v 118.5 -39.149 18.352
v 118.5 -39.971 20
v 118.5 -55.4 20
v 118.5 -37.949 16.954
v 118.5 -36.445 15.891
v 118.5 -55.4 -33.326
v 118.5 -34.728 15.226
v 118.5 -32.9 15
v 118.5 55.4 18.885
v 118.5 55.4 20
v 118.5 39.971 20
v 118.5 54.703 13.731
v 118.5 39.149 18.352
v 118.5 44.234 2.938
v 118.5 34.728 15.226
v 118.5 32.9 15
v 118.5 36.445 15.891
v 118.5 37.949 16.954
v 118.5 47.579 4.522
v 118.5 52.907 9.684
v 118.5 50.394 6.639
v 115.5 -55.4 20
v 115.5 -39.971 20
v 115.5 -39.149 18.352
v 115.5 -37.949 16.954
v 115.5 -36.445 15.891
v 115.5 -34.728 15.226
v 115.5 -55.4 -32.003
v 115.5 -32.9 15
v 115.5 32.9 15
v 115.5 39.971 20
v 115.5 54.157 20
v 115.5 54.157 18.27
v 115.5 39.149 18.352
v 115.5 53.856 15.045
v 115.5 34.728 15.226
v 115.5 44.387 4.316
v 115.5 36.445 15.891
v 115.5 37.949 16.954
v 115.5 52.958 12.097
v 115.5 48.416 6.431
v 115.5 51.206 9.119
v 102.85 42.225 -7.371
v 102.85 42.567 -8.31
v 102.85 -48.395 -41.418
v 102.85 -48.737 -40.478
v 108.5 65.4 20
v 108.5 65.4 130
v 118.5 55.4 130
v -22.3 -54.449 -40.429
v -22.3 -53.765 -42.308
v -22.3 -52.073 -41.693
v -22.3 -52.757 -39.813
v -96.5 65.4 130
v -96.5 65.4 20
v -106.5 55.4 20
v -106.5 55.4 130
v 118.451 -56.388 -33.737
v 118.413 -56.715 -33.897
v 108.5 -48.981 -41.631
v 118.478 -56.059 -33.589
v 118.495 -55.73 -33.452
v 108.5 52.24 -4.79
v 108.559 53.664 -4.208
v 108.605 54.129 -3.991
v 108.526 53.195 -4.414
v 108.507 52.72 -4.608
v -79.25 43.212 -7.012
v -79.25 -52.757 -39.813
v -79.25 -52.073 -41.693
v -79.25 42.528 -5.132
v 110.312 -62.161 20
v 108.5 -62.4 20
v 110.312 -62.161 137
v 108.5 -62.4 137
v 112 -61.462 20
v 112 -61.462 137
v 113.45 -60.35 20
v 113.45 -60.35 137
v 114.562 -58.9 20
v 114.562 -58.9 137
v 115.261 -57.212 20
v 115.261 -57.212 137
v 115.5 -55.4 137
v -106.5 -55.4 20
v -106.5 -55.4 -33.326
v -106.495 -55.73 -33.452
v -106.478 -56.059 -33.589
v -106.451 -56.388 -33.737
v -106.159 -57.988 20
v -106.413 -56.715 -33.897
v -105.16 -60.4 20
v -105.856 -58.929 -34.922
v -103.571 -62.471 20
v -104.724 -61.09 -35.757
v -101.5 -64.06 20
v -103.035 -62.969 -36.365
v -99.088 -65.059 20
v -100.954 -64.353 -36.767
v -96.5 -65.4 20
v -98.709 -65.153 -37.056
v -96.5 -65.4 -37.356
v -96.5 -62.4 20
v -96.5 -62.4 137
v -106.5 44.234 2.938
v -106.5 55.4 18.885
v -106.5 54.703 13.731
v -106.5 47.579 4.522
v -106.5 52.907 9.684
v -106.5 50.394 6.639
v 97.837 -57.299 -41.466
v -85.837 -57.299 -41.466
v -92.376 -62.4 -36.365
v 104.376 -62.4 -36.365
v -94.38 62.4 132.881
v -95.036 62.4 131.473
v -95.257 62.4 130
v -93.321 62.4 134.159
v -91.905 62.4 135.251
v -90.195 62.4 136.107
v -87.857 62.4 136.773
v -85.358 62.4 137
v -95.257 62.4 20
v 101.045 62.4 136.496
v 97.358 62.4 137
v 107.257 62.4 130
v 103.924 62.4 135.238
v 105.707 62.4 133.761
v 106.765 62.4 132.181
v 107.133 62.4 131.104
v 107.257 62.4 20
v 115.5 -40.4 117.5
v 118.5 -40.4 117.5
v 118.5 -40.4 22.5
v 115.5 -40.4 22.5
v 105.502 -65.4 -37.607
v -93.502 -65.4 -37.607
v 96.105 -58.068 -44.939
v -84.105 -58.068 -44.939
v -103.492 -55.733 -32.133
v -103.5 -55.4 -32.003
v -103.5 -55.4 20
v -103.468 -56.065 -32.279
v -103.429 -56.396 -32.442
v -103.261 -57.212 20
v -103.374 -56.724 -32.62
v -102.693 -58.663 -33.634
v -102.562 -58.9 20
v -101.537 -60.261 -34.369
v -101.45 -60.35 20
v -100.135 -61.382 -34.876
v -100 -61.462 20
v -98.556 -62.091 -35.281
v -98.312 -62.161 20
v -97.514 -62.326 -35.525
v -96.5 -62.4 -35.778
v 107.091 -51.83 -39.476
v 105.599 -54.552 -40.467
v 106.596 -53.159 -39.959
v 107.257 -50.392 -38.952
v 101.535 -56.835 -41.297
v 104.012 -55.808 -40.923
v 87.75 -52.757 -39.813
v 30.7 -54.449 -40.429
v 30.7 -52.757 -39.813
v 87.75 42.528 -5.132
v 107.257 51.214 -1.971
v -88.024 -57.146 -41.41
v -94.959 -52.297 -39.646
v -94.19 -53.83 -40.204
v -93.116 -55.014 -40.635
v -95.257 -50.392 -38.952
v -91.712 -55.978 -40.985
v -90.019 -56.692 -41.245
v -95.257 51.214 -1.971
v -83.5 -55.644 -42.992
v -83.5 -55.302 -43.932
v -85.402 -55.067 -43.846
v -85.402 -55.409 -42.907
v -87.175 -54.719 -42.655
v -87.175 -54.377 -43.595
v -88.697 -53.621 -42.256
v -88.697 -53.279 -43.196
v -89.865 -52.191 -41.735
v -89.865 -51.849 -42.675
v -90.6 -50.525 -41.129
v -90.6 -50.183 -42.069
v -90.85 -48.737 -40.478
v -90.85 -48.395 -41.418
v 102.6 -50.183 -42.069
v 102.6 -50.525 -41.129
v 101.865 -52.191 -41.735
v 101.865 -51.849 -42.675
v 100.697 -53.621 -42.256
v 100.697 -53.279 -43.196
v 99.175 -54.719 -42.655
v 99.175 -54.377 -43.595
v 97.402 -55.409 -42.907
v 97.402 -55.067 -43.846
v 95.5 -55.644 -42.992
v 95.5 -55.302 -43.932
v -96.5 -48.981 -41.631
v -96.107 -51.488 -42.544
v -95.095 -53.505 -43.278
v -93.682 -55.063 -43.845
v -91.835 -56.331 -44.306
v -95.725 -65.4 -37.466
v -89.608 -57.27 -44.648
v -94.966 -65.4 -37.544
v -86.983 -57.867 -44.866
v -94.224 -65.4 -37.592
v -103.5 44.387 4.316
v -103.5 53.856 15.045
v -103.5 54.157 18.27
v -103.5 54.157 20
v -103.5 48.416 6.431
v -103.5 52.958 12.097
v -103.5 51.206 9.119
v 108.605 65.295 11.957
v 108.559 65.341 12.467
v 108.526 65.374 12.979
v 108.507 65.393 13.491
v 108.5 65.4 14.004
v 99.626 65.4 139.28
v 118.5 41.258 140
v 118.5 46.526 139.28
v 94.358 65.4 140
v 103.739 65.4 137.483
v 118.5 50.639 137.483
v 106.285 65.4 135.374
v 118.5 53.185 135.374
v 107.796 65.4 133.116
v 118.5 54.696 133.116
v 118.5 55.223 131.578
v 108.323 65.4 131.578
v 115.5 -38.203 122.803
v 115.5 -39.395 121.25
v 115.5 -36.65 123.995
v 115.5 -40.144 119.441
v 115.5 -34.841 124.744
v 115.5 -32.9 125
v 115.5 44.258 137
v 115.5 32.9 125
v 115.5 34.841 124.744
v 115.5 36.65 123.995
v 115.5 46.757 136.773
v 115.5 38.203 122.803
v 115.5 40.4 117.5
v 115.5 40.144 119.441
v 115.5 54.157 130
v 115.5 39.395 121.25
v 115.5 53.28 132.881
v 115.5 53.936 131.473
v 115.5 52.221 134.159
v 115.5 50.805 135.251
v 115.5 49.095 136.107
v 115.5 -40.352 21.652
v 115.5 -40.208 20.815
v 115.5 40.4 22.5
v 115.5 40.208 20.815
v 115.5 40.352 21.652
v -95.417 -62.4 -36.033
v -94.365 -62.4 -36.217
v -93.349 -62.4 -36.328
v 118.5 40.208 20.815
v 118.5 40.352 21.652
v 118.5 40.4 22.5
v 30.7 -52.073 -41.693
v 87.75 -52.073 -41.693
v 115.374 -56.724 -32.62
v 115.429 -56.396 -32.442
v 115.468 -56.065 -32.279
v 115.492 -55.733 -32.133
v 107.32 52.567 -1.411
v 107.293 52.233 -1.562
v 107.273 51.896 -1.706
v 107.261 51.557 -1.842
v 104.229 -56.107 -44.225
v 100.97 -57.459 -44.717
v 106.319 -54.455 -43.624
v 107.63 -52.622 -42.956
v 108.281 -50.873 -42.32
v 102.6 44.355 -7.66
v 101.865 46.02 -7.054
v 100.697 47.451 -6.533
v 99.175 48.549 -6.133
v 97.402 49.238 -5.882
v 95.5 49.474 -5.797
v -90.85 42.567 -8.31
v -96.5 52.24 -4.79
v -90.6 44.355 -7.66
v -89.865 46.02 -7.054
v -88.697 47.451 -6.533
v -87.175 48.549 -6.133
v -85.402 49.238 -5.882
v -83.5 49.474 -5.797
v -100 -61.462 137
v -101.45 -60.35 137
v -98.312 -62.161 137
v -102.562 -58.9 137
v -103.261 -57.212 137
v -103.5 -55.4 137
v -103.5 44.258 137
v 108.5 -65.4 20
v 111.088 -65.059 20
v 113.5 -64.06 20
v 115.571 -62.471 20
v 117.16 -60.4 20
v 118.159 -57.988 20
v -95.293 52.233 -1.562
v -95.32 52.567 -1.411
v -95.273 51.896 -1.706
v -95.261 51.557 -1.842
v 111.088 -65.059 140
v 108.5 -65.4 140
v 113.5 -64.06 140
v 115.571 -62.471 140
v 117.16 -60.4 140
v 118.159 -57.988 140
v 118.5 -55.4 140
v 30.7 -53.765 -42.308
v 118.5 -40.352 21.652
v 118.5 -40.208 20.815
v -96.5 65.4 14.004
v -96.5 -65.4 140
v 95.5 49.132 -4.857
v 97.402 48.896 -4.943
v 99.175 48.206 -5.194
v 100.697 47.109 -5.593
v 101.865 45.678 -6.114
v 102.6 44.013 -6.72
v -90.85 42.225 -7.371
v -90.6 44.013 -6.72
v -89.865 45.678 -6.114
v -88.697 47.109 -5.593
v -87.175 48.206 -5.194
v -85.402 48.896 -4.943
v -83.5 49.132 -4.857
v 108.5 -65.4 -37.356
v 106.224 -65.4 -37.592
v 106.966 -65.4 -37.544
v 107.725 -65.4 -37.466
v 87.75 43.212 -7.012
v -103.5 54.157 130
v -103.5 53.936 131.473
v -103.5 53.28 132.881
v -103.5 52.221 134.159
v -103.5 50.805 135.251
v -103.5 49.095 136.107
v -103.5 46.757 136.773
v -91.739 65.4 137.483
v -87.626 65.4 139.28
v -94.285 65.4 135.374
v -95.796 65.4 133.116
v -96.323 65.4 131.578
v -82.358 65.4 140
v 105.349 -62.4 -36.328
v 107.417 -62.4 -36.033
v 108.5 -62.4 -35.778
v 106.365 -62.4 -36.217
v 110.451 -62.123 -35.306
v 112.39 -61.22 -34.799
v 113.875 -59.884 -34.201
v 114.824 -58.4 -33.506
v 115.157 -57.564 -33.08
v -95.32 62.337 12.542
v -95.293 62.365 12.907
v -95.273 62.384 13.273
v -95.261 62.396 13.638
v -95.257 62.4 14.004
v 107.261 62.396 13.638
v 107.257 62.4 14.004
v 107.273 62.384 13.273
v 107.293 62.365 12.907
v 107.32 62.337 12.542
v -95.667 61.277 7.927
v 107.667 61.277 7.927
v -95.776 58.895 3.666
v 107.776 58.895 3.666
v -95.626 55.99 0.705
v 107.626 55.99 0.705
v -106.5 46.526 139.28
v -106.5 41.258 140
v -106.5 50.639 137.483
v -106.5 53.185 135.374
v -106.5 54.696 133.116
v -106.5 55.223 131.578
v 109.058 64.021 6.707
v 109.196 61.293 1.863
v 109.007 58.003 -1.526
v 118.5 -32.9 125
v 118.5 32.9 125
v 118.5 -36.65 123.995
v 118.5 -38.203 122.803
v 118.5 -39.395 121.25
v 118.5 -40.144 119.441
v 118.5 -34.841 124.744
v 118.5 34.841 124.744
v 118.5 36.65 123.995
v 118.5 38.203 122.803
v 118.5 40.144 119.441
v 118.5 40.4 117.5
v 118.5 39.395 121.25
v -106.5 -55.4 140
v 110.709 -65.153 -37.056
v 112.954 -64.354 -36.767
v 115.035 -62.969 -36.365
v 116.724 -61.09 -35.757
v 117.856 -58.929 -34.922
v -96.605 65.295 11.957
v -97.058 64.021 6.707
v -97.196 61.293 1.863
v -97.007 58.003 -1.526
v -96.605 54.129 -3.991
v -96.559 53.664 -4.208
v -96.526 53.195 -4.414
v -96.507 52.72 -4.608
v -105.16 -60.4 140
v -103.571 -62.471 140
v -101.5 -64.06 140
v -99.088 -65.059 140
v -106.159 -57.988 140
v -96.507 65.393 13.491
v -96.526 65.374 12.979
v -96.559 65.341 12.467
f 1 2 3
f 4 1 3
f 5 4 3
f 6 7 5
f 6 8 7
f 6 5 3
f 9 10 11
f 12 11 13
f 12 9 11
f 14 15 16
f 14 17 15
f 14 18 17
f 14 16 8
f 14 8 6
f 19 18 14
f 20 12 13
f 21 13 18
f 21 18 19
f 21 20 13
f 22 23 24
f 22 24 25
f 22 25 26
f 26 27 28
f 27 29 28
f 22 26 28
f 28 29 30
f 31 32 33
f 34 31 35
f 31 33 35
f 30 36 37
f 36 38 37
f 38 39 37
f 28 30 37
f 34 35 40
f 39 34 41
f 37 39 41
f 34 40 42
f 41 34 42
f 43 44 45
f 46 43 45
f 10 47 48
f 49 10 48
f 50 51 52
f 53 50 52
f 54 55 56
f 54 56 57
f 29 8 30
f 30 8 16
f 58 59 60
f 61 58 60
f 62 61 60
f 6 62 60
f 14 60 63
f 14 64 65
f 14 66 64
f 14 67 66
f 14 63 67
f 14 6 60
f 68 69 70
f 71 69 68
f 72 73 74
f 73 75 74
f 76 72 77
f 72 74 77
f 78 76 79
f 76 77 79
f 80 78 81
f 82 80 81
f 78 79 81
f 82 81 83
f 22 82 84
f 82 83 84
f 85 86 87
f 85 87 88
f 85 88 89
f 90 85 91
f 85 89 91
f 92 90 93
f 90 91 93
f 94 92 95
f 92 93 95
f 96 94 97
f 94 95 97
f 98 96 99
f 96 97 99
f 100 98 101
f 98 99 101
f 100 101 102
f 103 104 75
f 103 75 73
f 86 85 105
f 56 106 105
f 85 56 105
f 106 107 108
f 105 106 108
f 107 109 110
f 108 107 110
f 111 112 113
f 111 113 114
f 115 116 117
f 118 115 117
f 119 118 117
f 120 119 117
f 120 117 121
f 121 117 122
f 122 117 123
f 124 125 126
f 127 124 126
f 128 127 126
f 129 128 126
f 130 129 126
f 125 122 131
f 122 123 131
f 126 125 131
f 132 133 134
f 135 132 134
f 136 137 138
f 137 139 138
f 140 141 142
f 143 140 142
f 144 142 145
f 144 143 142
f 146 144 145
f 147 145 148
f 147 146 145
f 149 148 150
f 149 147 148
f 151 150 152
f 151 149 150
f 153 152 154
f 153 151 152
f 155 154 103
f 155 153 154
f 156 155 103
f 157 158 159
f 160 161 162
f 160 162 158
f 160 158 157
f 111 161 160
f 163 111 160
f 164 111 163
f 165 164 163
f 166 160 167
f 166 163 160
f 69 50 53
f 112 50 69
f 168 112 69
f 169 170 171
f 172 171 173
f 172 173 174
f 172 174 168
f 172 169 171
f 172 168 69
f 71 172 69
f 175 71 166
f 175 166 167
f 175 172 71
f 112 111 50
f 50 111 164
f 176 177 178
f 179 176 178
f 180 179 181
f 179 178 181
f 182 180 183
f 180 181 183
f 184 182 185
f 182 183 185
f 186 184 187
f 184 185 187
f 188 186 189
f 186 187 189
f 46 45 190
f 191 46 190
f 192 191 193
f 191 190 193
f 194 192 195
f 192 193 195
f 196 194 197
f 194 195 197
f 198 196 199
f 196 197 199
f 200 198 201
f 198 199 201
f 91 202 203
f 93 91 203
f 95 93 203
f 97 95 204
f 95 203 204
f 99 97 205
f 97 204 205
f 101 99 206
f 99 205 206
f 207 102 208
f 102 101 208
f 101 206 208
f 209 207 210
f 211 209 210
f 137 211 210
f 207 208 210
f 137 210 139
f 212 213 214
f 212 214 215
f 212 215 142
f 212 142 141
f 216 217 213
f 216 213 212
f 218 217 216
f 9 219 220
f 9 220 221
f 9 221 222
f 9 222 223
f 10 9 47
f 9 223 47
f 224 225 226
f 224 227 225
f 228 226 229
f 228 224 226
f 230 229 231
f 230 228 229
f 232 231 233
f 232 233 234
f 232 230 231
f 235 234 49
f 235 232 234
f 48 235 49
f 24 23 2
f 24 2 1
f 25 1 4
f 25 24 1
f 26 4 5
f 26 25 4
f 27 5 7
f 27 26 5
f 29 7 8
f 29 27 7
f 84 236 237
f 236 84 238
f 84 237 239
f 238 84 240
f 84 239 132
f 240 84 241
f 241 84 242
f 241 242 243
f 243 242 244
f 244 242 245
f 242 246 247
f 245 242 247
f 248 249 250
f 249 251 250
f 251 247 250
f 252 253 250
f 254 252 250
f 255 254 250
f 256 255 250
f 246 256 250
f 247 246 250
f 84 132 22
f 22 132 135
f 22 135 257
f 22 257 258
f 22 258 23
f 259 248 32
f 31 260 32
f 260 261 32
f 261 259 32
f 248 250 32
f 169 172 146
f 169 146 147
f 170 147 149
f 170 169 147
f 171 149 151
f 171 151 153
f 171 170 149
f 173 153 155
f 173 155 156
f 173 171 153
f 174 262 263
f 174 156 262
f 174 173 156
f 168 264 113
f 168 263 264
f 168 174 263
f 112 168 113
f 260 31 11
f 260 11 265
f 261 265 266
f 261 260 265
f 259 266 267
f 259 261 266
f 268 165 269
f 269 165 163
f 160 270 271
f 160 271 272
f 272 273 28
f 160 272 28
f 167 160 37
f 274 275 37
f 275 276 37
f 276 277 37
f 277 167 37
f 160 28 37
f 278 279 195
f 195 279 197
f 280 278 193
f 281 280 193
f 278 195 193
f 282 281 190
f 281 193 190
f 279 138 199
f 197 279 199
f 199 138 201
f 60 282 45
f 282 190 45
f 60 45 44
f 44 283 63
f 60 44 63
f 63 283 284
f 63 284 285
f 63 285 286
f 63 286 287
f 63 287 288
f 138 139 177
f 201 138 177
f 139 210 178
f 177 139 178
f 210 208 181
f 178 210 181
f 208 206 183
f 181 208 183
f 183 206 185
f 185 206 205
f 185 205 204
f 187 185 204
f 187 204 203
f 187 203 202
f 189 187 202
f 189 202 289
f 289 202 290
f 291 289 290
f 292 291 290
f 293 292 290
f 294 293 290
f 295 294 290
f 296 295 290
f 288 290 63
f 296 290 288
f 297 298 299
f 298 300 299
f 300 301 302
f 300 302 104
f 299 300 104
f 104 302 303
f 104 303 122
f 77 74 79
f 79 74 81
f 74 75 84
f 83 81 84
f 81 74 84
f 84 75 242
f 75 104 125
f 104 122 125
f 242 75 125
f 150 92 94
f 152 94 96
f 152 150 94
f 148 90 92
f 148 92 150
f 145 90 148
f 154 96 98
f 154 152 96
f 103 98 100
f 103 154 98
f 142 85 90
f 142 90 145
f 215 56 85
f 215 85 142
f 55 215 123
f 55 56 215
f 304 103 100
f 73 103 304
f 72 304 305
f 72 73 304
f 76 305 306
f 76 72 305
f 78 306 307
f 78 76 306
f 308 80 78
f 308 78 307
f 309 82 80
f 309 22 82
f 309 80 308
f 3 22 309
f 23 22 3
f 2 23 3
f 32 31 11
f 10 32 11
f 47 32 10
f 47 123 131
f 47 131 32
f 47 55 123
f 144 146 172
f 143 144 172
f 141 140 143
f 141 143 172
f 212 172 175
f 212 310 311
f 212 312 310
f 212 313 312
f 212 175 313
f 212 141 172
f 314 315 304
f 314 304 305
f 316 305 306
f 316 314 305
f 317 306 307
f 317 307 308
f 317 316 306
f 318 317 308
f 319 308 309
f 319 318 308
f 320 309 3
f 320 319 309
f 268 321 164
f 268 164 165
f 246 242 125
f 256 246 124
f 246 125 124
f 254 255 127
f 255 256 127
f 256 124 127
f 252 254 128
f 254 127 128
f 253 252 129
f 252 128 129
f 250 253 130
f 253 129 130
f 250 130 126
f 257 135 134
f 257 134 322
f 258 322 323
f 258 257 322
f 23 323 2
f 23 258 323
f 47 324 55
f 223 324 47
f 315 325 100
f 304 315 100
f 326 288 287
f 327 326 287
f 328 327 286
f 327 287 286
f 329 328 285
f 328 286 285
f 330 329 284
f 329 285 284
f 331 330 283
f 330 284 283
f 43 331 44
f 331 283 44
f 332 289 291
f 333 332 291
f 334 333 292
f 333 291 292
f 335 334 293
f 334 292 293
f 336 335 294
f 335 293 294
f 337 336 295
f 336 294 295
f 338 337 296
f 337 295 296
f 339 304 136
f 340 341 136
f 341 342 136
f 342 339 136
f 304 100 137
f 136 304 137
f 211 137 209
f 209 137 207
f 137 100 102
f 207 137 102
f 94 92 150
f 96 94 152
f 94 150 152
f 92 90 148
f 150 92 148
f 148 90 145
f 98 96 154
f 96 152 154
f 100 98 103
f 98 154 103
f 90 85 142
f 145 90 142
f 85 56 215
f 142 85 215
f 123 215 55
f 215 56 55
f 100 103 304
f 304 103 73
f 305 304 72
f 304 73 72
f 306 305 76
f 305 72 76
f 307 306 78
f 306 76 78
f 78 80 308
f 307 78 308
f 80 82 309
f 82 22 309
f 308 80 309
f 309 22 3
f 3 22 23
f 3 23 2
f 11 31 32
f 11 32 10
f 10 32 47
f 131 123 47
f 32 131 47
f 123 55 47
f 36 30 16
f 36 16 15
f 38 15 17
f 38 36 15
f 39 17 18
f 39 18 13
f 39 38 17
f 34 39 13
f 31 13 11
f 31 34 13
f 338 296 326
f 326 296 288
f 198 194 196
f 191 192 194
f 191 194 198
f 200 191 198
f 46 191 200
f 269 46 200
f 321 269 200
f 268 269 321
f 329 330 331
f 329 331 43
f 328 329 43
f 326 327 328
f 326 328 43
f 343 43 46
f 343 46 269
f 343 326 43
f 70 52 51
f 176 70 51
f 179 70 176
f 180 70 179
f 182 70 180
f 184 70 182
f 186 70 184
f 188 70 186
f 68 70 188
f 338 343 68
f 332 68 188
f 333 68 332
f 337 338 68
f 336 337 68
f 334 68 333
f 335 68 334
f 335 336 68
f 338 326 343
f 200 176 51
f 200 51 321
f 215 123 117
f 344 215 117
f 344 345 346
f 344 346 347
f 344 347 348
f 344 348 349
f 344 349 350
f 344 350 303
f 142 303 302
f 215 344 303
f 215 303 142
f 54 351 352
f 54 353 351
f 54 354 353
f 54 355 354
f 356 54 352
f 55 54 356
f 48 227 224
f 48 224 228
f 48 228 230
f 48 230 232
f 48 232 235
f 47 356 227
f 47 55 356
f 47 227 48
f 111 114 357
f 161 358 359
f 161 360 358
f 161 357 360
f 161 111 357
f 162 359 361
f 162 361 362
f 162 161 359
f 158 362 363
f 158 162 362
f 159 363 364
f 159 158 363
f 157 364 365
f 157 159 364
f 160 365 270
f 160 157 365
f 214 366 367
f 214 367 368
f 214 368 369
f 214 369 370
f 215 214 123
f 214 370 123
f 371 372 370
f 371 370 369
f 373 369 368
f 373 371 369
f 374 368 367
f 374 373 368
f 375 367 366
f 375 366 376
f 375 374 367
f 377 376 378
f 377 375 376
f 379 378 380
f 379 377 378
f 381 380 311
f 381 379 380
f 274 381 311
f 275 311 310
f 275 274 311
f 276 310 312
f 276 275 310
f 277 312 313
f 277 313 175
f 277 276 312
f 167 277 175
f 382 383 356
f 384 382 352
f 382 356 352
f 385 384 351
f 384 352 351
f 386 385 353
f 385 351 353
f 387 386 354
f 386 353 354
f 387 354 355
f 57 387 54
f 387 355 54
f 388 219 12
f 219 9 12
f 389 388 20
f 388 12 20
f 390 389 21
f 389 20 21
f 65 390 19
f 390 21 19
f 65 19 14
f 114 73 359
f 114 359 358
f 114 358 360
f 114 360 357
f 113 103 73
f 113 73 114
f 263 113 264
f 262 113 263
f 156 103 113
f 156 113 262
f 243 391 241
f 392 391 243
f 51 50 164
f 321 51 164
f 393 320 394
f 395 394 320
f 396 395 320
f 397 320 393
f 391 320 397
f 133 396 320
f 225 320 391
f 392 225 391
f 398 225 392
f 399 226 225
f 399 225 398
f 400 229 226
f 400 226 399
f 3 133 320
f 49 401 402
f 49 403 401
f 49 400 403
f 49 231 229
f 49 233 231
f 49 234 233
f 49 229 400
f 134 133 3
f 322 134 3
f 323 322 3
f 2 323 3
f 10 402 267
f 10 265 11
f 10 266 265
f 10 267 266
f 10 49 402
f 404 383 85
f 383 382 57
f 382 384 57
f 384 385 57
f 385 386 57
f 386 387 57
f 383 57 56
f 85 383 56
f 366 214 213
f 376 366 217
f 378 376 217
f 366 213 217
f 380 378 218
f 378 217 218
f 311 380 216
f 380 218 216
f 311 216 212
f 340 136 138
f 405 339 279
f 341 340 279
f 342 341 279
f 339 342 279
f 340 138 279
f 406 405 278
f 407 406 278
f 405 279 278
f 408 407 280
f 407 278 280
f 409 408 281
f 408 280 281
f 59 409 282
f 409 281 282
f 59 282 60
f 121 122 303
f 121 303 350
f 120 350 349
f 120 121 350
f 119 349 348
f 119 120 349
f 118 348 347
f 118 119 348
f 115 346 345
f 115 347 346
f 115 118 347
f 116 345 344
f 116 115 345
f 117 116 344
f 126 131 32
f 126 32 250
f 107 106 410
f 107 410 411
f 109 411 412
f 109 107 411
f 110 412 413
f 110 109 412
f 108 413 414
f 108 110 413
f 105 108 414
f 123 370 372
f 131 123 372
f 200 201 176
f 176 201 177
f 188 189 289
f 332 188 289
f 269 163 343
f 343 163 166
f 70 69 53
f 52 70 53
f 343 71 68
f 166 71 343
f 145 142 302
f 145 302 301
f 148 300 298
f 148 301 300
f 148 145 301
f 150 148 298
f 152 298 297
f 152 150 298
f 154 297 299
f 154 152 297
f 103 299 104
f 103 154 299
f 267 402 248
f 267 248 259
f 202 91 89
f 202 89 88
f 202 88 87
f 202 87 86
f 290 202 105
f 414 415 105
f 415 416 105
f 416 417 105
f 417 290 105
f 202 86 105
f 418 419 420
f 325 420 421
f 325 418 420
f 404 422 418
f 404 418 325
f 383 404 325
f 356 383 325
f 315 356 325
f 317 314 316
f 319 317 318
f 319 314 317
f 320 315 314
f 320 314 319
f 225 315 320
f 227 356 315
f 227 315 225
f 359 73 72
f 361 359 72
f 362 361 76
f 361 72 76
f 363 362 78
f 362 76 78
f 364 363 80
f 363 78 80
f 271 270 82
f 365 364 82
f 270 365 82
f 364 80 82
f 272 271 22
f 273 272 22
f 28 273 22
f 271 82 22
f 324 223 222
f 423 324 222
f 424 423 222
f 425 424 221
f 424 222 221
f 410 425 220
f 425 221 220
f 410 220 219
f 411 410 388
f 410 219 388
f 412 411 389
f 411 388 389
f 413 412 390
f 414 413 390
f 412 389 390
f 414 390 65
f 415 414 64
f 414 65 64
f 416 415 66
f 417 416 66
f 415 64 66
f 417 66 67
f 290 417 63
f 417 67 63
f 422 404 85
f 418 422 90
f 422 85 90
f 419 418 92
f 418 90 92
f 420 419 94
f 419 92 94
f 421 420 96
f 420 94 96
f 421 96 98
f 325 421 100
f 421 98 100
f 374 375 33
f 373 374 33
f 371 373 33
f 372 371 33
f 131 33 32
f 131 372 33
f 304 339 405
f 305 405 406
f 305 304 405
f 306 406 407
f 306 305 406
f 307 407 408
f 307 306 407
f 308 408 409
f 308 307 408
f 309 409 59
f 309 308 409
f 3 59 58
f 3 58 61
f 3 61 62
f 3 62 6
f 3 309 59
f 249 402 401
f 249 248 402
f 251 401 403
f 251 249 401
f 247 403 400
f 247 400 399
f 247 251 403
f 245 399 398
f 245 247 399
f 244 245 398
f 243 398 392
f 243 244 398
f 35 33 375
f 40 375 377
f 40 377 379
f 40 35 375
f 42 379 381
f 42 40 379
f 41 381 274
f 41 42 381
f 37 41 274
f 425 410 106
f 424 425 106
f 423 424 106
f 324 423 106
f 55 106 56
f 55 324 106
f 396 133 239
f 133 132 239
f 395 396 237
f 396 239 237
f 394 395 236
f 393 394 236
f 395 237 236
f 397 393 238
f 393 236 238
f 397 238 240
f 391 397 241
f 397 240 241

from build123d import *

# Parameters (mm, degrees)
SKETCH1_W           = 225
SKETCH1_H           = 130.8
BOSS_EXTRUDE1_DEPTH = 140
BOSS_EXTRUDE2_DEPTH = 225
CHAMFER1_SIZE       = 10
FILLET1_R           = 10
FILLET2_R           = 20
FILLET3_R           = 24
CHAMFER2_SIZE       = 10
CHAMFER2_SIZE2      = 7.802060087
FILLET4_R           = 12.5
FILLET5_R           = 10
SHELL1_T            = 3
SKETCH3_W           = 110
SKETCH3_H           = 80.8
CUT_EXTRUDE1_DEPTH  = 3
FILLET6_R           = 7.5
CUT_EXTRUDE2_DEPTH  = 1
CUT_EXTRUDE3_REACH  = 212.374
SKETCH6_W           = 53
SKETCH6_H           = 3
SKETCH6_W_2         = 167
SKETCH6_H_2         = 101.4


with BuildPart() as part:
    # Sketch1 → Boss-Extrude1 (new body)
    with BuildSketch(Plane.XY):
        with Locations((6, 0)):
            Rectangle(SKETCH1_W, SKETCH1_H)
    extrude(amount=BOSS_EXTRUDE1_DEPTH)

    # Sketch2 → Boss-Extrude2 (add)
    with BuildSketch(Plane.ZY.offset(106.5)):
        Polygon((-47.607306642, -65.4), (0, 65.4), (0, -65.4), align=None)
    extrude(amount=-BOSS_EXTRUDE2_DEPTH)

    # Chamfer1
    chamfer1_edges = [part.edges().sort_by_distance(p)[0] for p in [
        (118.5, 0, -23.803653321),
        (-106.5, 0, -23.803653321),
        (118.5, 65.4, 70),
        (-106.5, 65.4, 70),
    ]]
    chamfer(chamfer1_edges, length=CHAMFER1_SIZE)

    # Fillet1
    fillet1_edges = [part.edges().sort_by_distance(p)[0] for p in [
        (113.5, 60.4, 140),
        (-101.5, 60.4, 140),
    ]]
    fillet(fillet1_edges, radius=FILLET1_R)

    # Fillet2
    fillet2_edges = [part.edges().sort_by_distance(p)[0] for p in [
        (6, 65.4, 0),
    ]]
    fillet(fillet2_edges, radius=FILLET2_R)

    # Fillet3
    fillet3_edges = [part.edges().sort_by_distance(p)[0] for p in [
        (-103.308479557, 58.591520443, 4.76734871),
        (115.308479557, 58.591520443, 4.76734871),
    ]]
    fillet(fillet3_edges, radius=FILLET3_R)

    # Chamfer2
    chamfer2_edges = [part.edges().sort_by_distance(p)[0] for p in [
        (6, -65.4, -47.607306642),
    ]]
    chamfer2_side = [part.faces().sort_by_distance(p)[0] for p in [
        (6, -65.4, 46.424462894),
    ]]
    chamfer(chamfer2_edges, length=CHAMFER2_SIZE, length2=CHAMFER2_SIZE2, reference=chamfer2_side[0])

    # Fillet4
    fillet4_edges = [part.edges().sort_by_distance(p)[0] for p in [
        (113.198463104, -61.734230855, -41.273075787),
        (-101.198463104, -61.734230855, -41.273075787),
    ]]
    fillet(fillet4_edges, radius=FILLET4_R)

    # Fillet5
    fillet5_edges = [part.edges().sort_by_distance(p)[0] for p in [
        (-106.5, -65.4, 53.126939576),
        (118.5, -65.4, 53.126939576),
    ]]
    fillet(fillet5_edges, radius=FILLET5_R)

    # Shell1 (no face opened: a closed hollow body)
    add(offset(amount=-SHELL1_T, mode=Mode.PRIVATE), mode=Mode.SUBTRACT)

    # Sketch3 → Cut-Extrude1 (cut)
    with BuildSketch(Plane(origin=(118.5, 0, 0), x_dir=(0, 0, -1), z_dir=(1, 0, 0))):
        with Locations((-70, 0)):
            Rectangle(SKETCH3_W, SKETCH3_H)
    extrude(amount=-CUT_EXTRUDE1_DEPTH, mode=Mode.SUBTRACT)

    # Fillet6
    fillet6_edges = [part.edges().sort_by_distance(p)[0] for p in [
        (117, 40.4, 125),
        (117, 40.4, 15),
        (117, -40.4, 15),
        (117, -40.4, 125),
    ]]
    fillet(fillet6_edges, radius=FILLET6_R)

    # Sketch5 → Cut-Extrude2 (cut)
    with BuildSketch(Plane(origin=(0, 7.65034671, -21.019154837), x_dir=(-1, 0, 0), z_dir=(0, 0.3420201433256695, -0.9396926207859082))):
        with BuildLine():
            Line((90.85, -59.642374259), (90.85, 37.157625741))
            ThreePointArc((90.85, 37.157625741), (88.697234842, 42.354860583), (83.5, 44.507625741))
            Line((83.5, 44.507625741), (-95.5, 44.507625741))
            ThreePointArc((-95.5, 44.507625741), (-100.697234842, 42.354860583), (-102.85, 37.157625741))
            Line((-102.85, 37.157625741), (-102.85, -59.642374259))
            ThreePointArc((-102.85, -59.642374259), (-100.697234842, -64.839609101), (-95.5, -66.992374259))
            Line((-95.5, -66.992374259), (83.5, -66.992374259))
            ThreePointArc((83.5, -66.992374259), (88.697234842, -64.839609101), (90.85, -59.642374259))
        make_face()
    extrude(amount=-CUT_EXTRUDE2_DEPTH, mode=Mode.SUBTRACT)

    # Sketch6 → Cut-Extrude3 (cut, up to next)
    with BuildSketch(Plane(origin=(0, 6.62428628, -18.200076974), x_dir=(1, 0, 0), z_dir=(0, -0.3420201433256695, 0.9396926207859082)), mode=Mode.PRIVATE) as cut_extrude3_sk1:
        with Locations((4.2, -63.492374259)):
            Rectangle(SKETCH6_W, SKETCH6_H)
    cut_extrude3_tool1 = extrude(cut_extrude3_sk1.sketch, amount=-CUT_EXTRUDE3_REACH, mode=Mode.PRIVATE) & part.part
    # Sketch6 → Cut-Extrude3 (cut, up to next)
    with BuildSketch(Plane(origin=(0, 6.62428628, -18.200076974), x_dir=(1, 0, 0), z_dir=(0, -0.3420201433256695, 0.9396926207859082)), mode=Mode.PRIVATE) as cut_extrude3_sk2:
        with Locations((4.25, -12.492374259)):
            Rectangle(SKETCH6_W_2, SKETCH6_H_2)
    cut_extrude3_tool2 = extrude(cut_extrude3_sk2.sketch, amount=-CUT_EXTRUDE3_REACH, mode=Mode.PRIVATE) & part.part
    add(cut_extrude3_tool1.solids().sort_by_distance((4.2, -53.039029, -39.915748))[0], mode=Mode.SUBTRACT)
    add(cut_extrude3_tool2.solids().sort_by_distance((4.25, -5.114706, -22.472721))[0], mode=Mode.SUBTRACT)


with BuildPart() as body_2:
    # Split1: the piece on the far side of the plane
    add(part.part)
    split(bisect_by=Plane.XY.offset(20), keep=Keep.BOTTOM)


with BuildPart() as part_1:
    add(part.part)

    # Split1
    split(bisect_by=Plane.XY.offset(20), keep=Keep.TOP)


solid = Compound([body_2.part, part_1.part])
